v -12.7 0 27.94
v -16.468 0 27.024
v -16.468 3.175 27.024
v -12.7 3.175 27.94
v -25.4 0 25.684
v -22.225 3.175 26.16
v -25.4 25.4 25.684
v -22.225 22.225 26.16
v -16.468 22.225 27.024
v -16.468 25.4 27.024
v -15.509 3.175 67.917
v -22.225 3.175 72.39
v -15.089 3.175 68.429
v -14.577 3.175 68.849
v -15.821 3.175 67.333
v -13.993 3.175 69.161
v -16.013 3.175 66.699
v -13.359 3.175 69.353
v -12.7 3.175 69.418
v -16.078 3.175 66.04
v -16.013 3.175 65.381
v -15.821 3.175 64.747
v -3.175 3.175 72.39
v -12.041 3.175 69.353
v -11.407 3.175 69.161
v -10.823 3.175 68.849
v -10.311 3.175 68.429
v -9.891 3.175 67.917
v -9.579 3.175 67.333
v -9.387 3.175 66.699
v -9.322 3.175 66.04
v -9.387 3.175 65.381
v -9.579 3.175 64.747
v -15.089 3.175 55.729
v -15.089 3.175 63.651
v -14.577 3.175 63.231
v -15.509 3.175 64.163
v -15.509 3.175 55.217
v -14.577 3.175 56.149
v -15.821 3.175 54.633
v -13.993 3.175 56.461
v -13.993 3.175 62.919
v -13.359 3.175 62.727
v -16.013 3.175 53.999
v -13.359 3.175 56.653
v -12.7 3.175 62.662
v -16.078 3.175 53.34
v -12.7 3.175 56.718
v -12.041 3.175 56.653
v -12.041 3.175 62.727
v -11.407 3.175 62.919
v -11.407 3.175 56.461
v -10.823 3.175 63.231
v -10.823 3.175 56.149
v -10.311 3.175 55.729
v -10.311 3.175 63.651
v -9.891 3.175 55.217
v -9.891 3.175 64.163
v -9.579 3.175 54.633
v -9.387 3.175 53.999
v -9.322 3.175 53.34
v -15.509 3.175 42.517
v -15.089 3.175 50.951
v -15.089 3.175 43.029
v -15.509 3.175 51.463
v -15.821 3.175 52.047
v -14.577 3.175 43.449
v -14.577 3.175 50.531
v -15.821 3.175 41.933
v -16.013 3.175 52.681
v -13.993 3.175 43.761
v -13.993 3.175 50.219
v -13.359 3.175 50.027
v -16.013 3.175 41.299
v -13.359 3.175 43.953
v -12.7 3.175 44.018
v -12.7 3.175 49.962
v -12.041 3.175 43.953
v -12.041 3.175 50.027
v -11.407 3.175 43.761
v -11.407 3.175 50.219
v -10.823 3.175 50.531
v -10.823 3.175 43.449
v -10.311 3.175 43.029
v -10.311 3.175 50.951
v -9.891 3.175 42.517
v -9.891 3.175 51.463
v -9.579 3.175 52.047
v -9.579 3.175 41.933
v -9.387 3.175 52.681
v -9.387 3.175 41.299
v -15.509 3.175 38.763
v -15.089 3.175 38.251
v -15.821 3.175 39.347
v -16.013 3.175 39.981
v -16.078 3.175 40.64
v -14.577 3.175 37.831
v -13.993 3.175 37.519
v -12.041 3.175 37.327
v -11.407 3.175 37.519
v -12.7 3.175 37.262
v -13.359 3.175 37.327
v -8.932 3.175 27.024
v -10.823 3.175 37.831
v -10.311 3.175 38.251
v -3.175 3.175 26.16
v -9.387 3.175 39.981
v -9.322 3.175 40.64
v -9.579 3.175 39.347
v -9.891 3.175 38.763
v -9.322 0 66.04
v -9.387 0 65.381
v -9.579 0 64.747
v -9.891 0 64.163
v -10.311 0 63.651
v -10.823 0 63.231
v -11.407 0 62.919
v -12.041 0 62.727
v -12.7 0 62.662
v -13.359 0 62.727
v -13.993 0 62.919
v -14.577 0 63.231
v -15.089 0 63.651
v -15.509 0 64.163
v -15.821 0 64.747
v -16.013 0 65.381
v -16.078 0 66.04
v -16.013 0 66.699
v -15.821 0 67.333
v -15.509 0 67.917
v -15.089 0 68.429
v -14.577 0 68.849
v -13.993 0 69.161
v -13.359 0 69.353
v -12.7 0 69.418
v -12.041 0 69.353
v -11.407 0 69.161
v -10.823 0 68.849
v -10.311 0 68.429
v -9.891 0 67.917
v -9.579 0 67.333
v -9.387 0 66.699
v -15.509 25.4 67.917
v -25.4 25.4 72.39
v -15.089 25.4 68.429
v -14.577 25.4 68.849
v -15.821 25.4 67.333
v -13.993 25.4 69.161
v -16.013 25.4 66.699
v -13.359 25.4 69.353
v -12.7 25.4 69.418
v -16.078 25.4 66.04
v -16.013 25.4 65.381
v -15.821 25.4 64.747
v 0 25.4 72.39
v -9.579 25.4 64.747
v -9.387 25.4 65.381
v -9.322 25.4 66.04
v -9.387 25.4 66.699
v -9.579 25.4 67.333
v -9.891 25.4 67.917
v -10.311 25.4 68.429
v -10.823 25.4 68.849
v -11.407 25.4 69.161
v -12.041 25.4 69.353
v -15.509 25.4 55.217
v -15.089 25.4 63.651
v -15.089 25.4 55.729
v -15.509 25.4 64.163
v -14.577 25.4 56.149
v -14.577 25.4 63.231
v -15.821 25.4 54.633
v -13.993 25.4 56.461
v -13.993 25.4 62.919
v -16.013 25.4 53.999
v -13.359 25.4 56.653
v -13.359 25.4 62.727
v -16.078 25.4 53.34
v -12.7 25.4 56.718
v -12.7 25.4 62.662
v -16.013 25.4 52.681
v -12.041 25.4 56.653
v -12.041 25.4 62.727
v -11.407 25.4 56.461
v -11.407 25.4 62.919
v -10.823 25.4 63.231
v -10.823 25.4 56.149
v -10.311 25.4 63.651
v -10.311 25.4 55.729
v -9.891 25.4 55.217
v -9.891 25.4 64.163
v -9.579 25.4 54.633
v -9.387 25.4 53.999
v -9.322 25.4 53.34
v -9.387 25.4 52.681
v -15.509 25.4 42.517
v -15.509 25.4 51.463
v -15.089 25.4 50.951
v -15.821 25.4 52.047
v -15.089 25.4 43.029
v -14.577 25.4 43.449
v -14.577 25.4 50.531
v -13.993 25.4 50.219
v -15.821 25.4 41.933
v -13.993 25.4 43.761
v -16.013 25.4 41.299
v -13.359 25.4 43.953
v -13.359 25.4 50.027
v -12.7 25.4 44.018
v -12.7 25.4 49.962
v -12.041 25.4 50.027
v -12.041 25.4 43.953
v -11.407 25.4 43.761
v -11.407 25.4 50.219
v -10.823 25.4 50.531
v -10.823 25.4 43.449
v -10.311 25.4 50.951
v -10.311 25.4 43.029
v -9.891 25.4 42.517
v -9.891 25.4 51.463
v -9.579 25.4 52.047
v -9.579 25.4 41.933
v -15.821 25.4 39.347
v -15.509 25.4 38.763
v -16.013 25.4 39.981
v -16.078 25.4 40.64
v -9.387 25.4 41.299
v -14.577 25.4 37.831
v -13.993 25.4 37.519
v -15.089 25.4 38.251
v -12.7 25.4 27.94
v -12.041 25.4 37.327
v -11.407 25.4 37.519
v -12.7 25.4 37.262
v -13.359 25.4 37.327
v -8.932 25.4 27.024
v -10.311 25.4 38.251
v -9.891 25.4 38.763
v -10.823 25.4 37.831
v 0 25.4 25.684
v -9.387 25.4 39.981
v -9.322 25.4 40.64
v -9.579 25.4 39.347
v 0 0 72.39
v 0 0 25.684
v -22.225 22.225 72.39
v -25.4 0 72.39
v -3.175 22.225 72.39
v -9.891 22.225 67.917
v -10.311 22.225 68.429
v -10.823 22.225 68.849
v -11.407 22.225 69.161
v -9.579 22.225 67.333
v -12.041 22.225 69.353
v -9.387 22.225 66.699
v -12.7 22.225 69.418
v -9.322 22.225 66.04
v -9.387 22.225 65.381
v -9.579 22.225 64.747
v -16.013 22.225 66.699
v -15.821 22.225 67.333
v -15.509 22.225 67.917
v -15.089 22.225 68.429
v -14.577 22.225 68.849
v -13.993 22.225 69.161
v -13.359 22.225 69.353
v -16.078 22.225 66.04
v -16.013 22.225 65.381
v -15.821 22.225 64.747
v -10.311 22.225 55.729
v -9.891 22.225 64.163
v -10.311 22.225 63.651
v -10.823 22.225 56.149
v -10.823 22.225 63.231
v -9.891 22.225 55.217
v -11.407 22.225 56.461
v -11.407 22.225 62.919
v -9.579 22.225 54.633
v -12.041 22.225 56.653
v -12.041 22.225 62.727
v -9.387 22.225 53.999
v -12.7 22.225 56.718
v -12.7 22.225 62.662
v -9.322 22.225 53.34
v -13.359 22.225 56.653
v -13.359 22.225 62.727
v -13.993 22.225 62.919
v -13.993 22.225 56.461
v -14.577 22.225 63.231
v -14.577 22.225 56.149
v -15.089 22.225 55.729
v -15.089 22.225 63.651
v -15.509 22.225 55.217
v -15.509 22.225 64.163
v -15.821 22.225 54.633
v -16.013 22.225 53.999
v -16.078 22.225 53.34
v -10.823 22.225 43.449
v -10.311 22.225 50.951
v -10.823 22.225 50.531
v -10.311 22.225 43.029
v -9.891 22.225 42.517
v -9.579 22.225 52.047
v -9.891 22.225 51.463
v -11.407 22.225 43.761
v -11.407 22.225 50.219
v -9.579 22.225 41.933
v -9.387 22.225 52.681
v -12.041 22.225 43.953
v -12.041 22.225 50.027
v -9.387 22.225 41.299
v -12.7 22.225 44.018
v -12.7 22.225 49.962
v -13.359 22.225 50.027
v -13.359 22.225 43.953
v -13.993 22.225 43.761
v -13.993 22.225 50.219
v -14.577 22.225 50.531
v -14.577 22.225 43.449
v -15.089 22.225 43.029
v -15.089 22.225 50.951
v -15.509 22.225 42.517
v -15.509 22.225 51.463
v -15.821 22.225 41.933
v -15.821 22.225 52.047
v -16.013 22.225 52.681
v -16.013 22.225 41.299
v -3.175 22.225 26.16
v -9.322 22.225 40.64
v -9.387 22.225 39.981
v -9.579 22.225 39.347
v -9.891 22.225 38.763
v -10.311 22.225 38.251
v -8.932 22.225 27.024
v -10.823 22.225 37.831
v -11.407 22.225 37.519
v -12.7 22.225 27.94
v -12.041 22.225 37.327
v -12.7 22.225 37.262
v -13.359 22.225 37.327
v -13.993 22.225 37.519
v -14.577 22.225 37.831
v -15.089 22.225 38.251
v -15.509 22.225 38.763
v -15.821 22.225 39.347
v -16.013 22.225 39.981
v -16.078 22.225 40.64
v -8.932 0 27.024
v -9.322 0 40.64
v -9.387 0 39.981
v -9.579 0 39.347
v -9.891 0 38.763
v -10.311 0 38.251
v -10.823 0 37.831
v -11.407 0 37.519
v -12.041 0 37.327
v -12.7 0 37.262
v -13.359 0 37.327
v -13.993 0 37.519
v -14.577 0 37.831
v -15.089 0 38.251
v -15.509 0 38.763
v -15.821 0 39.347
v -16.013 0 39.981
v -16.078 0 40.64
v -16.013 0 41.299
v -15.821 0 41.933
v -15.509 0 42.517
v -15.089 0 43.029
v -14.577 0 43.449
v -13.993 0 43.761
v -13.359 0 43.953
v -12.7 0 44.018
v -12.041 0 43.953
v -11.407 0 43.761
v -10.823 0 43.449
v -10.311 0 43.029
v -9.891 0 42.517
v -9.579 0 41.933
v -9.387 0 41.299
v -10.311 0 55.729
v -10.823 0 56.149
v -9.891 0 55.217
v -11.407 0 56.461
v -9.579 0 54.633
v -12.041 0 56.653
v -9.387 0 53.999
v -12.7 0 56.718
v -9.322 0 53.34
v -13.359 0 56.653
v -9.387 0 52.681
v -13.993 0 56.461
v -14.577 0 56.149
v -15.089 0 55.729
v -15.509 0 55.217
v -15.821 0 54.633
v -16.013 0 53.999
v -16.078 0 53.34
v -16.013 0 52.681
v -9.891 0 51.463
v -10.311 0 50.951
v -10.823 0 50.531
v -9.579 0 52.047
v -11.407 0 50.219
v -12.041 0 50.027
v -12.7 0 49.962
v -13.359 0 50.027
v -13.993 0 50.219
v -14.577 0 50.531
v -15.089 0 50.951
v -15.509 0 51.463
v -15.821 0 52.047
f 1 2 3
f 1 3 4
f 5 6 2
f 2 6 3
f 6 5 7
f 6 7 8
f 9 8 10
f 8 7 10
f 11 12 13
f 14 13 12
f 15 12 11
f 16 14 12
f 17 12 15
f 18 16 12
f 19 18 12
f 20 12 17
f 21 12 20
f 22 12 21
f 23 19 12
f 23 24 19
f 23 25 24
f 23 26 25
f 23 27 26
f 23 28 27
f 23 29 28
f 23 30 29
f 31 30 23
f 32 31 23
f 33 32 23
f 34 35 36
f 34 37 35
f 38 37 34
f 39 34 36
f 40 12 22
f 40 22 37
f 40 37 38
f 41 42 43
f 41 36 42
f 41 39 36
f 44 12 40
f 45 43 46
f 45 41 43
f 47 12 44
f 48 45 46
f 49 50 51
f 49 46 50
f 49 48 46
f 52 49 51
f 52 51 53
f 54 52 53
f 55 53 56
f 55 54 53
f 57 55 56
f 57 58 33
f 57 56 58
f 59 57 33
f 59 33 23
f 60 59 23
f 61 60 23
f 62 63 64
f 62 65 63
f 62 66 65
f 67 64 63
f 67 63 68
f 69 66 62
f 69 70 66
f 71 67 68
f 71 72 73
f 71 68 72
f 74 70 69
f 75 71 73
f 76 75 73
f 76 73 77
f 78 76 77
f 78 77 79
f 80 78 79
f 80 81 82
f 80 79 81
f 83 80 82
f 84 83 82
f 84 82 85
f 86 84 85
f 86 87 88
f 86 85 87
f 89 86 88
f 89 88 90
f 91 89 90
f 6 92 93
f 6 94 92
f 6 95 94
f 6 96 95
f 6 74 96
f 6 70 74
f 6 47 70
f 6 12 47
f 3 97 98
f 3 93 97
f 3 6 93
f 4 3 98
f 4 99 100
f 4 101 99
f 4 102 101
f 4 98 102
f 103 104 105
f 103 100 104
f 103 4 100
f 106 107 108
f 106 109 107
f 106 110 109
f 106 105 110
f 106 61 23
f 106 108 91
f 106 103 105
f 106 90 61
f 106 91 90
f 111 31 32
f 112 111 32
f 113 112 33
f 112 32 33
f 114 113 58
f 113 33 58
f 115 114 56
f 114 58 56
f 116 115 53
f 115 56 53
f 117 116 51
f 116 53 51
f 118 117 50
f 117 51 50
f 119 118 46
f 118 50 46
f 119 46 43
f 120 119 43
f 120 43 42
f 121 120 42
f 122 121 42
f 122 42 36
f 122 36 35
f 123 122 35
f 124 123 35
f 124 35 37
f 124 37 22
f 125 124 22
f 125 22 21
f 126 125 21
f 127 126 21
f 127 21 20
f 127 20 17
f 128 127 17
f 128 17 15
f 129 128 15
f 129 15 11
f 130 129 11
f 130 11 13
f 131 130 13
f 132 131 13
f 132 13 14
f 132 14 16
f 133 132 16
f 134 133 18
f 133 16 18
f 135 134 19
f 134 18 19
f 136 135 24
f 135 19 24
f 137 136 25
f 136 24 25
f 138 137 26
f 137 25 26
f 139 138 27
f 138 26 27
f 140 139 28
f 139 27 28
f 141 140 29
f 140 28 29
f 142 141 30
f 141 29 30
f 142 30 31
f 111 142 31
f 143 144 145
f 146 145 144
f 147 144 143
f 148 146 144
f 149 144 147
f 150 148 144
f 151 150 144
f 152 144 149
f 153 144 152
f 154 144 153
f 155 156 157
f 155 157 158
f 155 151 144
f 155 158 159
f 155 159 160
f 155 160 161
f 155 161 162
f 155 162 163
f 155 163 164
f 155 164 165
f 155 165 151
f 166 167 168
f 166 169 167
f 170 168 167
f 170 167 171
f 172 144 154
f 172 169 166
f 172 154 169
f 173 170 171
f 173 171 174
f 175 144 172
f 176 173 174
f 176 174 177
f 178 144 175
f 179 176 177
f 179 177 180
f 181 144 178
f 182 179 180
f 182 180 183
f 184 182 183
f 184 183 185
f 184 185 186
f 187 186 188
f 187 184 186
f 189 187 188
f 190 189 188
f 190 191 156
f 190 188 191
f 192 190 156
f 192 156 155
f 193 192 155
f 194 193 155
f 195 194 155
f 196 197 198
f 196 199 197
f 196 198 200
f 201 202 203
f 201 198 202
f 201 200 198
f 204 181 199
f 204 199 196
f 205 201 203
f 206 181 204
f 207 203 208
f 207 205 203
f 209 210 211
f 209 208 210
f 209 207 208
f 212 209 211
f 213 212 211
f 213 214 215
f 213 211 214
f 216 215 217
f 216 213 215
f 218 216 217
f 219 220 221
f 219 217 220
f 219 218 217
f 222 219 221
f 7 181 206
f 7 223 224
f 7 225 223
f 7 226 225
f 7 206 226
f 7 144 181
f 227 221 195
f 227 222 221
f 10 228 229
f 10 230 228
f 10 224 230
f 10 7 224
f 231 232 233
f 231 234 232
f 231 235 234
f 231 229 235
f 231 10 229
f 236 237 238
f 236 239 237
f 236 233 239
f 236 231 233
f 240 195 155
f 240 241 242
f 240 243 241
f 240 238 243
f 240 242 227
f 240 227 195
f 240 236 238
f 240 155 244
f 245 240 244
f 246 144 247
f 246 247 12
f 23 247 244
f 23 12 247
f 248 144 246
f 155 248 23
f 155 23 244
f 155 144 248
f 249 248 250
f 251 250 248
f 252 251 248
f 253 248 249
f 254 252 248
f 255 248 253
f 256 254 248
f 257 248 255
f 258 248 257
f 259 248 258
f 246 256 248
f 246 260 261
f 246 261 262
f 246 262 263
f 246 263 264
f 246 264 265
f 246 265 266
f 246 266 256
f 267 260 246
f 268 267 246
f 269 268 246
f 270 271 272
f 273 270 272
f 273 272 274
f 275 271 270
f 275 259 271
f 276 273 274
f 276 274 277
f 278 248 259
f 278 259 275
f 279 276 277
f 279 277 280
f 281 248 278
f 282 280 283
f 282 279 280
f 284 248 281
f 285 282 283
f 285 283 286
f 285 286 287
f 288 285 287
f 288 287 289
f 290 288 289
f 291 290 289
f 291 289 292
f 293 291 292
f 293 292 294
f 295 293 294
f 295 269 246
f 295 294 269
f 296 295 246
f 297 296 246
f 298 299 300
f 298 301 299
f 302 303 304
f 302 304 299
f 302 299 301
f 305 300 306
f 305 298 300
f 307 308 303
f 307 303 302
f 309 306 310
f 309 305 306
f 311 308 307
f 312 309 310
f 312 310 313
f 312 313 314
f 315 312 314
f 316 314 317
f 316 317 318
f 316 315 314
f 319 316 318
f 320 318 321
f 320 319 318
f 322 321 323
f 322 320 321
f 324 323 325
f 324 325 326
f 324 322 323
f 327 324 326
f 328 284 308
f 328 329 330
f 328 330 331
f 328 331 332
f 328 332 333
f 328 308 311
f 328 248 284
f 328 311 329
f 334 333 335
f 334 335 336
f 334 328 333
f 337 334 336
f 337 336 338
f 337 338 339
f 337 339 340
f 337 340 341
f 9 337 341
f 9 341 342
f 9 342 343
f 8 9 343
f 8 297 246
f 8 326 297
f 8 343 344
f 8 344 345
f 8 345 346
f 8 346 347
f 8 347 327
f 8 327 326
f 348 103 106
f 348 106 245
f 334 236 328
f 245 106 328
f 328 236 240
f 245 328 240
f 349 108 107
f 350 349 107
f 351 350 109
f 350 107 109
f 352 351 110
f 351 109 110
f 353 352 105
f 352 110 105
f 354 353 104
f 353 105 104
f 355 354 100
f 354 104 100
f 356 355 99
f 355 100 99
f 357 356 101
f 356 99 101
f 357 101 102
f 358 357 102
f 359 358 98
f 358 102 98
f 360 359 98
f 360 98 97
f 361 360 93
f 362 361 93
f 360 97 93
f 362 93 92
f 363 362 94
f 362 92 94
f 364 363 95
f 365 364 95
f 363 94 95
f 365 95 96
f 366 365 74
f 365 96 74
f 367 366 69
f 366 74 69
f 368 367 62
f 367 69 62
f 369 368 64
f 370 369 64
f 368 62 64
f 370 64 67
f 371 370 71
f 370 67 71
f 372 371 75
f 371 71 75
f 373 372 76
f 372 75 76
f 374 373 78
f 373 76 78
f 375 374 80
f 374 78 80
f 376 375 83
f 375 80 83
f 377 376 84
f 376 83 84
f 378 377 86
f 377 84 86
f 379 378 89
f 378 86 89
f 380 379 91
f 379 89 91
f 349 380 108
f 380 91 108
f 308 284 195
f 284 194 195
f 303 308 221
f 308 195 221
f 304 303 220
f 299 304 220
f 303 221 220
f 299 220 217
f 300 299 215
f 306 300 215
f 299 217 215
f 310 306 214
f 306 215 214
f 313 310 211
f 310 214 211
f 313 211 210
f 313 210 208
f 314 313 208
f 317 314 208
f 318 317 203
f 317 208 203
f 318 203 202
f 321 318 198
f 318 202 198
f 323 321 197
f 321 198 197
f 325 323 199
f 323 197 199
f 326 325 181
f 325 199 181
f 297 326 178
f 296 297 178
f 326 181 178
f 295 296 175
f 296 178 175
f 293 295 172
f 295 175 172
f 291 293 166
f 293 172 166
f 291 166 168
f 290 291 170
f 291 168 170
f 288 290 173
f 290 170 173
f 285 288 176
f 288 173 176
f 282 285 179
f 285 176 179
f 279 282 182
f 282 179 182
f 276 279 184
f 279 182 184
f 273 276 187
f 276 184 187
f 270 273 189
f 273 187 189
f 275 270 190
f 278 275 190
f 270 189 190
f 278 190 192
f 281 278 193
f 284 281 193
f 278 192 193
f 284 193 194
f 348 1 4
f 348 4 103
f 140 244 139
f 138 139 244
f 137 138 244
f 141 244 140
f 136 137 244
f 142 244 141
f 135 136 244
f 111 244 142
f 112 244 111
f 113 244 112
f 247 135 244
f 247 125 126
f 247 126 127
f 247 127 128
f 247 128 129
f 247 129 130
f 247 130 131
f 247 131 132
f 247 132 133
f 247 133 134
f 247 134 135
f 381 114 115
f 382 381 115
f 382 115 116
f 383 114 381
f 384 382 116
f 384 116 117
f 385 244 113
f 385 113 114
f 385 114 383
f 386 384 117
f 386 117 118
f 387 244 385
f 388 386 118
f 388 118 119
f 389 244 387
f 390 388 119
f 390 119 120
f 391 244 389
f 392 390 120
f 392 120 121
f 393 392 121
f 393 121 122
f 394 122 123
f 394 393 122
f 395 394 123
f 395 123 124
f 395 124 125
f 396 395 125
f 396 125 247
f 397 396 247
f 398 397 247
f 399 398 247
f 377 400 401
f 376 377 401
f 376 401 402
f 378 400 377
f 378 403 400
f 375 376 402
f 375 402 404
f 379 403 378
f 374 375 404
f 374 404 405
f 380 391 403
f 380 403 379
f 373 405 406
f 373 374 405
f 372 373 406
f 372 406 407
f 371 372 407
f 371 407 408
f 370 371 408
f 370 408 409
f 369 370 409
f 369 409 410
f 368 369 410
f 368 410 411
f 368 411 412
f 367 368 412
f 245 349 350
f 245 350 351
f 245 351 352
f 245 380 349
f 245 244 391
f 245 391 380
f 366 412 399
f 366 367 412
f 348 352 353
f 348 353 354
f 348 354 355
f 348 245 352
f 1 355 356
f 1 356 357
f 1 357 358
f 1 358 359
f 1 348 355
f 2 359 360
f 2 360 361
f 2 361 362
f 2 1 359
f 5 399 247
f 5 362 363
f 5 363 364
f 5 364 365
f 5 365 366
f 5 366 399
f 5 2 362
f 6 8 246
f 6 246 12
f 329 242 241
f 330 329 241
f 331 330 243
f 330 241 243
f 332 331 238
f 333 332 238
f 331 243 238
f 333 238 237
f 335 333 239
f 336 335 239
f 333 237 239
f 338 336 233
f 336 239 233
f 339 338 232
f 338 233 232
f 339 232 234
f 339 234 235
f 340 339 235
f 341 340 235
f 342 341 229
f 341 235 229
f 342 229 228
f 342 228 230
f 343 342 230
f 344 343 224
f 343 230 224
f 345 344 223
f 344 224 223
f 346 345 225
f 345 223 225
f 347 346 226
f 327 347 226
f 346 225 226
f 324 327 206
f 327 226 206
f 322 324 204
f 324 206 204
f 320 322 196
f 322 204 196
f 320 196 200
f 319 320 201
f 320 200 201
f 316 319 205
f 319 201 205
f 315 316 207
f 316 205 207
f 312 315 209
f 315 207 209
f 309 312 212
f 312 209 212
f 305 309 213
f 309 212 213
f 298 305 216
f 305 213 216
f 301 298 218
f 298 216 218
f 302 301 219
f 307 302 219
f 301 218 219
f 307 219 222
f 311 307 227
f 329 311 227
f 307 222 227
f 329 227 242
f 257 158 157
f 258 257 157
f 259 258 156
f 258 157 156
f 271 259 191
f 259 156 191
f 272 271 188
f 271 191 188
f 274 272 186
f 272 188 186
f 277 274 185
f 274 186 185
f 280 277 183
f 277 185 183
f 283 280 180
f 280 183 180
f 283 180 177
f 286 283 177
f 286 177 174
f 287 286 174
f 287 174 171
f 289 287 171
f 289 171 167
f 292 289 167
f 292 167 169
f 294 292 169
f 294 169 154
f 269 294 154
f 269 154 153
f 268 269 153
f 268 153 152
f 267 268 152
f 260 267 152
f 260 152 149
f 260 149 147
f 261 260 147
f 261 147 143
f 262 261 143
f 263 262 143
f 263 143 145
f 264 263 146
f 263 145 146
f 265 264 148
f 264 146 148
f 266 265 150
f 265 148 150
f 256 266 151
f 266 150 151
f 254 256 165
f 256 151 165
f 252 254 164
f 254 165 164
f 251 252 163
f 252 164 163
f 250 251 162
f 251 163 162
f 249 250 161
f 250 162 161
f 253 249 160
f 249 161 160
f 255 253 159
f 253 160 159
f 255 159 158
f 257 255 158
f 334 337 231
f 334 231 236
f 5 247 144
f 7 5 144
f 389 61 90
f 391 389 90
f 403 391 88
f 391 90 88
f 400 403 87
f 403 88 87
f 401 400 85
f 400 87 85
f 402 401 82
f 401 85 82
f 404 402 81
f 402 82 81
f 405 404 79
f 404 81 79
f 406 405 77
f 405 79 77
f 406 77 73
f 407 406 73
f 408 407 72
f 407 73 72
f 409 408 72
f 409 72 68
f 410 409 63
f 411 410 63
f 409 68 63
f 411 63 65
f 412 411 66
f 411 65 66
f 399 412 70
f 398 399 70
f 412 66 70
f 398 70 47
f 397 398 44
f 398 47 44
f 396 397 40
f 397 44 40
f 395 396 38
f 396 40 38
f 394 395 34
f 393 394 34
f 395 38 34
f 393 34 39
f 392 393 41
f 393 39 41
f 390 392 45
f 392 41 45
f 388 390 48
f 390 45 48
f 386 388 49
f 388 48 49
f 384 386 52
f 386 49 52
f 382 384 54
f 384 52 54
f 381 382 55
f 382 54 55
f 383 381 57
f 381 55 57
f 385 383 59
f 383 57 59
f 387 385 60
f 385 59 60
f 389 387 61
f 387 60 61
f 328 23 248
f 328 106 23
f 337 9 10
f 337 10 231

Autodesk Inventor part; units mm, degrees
ref_plane "YZ Plane" through (0, 0, 0) normal (1, 0, 0) x (0, 1, 0)
ref_plane "XZ Plane" through (0, 0, 0) normal (0, 1, 0) x (-1, 0, 0)
ref_plane "XY Plane" through (0, 0, 0) normal (0, 0, 1) x (1, 0, 0)
sketch "Sketch1" plane through (0, 0, 0) normal (0, 0, 1) x (1, 0, 0)
  line L0 (0, 0) -> (-25.4, 0)
  line L1 (-25.4, 0) -> (-25.4, 25.4)
  line L2 (-25.4, 25.4) -> (0, 25.4)
  line L3 (0, 25.4) -> (0, 0)
  line L4 (-3.175, 22.225) -> (-22.225, 22.225)
  line L5 (-22.225, 22.225) -> (-22.225, 3.175)
  line L6 (-22.225, 3.175) -> (-3.175, 3.175)
  line L7 (-3.175, 3.175) -> (-3.175, 22.225)
  dimension "d2" = 25.4
  dimension "d4" = 25.4
  dimension "d5" = 3.175
extrude "Extrusion1" add sketch "Sketch1" along normal blind 72.39
sketch "Sketch2" plane through (-25.4, 25.4, 0) normal (0, 1, 0) x (1, 0, 0)
  line L0 (0, 0) -> (25.4, 0) projected
  line L1 (0, 0) -> (0, -72.39) projected
  line L2 (0, 0) -> (0, -1.905)
  line L3 (12.7, 0) -> (12.7, -1.905)
  line L4 (12.7, -1.905) -> (0, 0)
  line L5 (12.7, -1.905) -> (25.4, 0)
  line L6 (25.4, 0) -> (25.4, -72.39) projected
  line L7 (12.7, -1.905) -> (8.9322, -27.024)
  line L8 (12.7, -1.905) -> (16.4678, -27.024)
  line L9 (0, -25.6842) -> (8.9322, -27.024)
  line L10 (16.4678, -27.024) -> (25.4, -25.6842)
  line L11 (8.9322, -27.024) -> (17.0812, -28.2463)
  line L12 (16.4678, -27.024) -> (8.6718, -28.1934)
  dimension "d8" = 1.905
  dimension "d9" = 1.905
  dimension "d23" = 25.4
  dimension "d24" = 90
  dimension "d25" = 25.4
  dimension "d26" = 90
extrude "Extrusion2" cut sketch "Sketch2" against normal blind 25.4 contours L4 L7 L9 L1 | L0 L3 L4 | L0 L5 L3 | L5 L6 L10 L8
sketch "Sketch3" plane through (-25.4, 25.4, 72.39) normal (0, 1, 0) x (1, 0, 0)
  line L0 (25.4, 0) -> (0, 0) projected
  line L1 (25.4, 46.7058) -> (25.4, 0) projected
  line L2 (12.7, 0) -> (12.7, 70.485) construction
  line L3 (12.7, 0) -> (12.7, 6.35)
  circle A0 centre (12.7, 6.35) radius 3.3782
  circle A1 centre (12.7, 19.05) radius 3.3782
  circle A2 centre (12.7, 31.75) radius 3.3782
  point P0 (25.4, 72.39)
  dimension "d12" = 6.35
  dimension "d13" = 6.7564
  dimension "d16" = 12.7
extrude "Extrusion3" cut sketch "Sketch3" against normal blind 25.4
sketch "Sketch4" plane through (-12.7, 0, 15.24) normal (0, -1, 0) x (1, 0, 0)
  arc A0 (-1.55, -3.0016) -> (1.55, -3.0016) centre (0, 0) ccw projected
  line L0 (-3.7678, 11.784) -> (0, -13.335) projected
  line L1 (0, -13.335) -> (3.7678, 11.784) projected
  point P0 (12.7, -15.24)
extrude "Extrusion4" cut sketch "Sketch4" against normal blind 25.4
sketch "Sketch5" plane through (-25.4, 0, 72.39) normal (0, -1, 0) x (1, 0, 0)
  arc A0 (15.0625, -54.7353) -> (10.3375, -54.7353) centre (12.7, -57.15) ccw projected
  line L0 (12.7, -70.485) -> (16.4678, -45.366) projected
  line L1 (8.9322, -45.366) -> (12.7, -70.485) projected
  circle A1 centre (12.7, -44.45) radius 3.3782 projected
  line L2 (8.9322, -45.366) -> (12.7, -44.45)
  line L3 (12.7, -44.45) -> (16.4678, -45.366)
  point P0 (25.4, -72.39)
extrude "Extrusion5" cut sketch "Sketch5" against normal blind 25.4 contours A0 L1 L2 A1 L3 L0 | A1 L2 L3 picked at (14.5428, -45.7157)
sketch "Sketch8" plane through (-12.7, 25.4, 15.24) normal (0, 1, 0) x (1, 0, 0)
  arc A0 (-2.3625, -2.4147) -> (2.3625, -2.4147) centre (0, 0) ccw projected
  line L0 (2.3625, -2.4147) -> (1.55, 3.0016) projected
  arc A1 (1.55, 3.0016) -> (-1.55, 3.0016) centre (0, 0) ccw projected
  line L1 (-1.55, 3.0016) -> (-2.3625, -2.4147) projected
  point P0 (12.7, 15.24)
extrude "Extrusion6" cut sketch "Sketch8" against normal blind 25.4
properties part number "V mount" material "Aluminum 6061"
